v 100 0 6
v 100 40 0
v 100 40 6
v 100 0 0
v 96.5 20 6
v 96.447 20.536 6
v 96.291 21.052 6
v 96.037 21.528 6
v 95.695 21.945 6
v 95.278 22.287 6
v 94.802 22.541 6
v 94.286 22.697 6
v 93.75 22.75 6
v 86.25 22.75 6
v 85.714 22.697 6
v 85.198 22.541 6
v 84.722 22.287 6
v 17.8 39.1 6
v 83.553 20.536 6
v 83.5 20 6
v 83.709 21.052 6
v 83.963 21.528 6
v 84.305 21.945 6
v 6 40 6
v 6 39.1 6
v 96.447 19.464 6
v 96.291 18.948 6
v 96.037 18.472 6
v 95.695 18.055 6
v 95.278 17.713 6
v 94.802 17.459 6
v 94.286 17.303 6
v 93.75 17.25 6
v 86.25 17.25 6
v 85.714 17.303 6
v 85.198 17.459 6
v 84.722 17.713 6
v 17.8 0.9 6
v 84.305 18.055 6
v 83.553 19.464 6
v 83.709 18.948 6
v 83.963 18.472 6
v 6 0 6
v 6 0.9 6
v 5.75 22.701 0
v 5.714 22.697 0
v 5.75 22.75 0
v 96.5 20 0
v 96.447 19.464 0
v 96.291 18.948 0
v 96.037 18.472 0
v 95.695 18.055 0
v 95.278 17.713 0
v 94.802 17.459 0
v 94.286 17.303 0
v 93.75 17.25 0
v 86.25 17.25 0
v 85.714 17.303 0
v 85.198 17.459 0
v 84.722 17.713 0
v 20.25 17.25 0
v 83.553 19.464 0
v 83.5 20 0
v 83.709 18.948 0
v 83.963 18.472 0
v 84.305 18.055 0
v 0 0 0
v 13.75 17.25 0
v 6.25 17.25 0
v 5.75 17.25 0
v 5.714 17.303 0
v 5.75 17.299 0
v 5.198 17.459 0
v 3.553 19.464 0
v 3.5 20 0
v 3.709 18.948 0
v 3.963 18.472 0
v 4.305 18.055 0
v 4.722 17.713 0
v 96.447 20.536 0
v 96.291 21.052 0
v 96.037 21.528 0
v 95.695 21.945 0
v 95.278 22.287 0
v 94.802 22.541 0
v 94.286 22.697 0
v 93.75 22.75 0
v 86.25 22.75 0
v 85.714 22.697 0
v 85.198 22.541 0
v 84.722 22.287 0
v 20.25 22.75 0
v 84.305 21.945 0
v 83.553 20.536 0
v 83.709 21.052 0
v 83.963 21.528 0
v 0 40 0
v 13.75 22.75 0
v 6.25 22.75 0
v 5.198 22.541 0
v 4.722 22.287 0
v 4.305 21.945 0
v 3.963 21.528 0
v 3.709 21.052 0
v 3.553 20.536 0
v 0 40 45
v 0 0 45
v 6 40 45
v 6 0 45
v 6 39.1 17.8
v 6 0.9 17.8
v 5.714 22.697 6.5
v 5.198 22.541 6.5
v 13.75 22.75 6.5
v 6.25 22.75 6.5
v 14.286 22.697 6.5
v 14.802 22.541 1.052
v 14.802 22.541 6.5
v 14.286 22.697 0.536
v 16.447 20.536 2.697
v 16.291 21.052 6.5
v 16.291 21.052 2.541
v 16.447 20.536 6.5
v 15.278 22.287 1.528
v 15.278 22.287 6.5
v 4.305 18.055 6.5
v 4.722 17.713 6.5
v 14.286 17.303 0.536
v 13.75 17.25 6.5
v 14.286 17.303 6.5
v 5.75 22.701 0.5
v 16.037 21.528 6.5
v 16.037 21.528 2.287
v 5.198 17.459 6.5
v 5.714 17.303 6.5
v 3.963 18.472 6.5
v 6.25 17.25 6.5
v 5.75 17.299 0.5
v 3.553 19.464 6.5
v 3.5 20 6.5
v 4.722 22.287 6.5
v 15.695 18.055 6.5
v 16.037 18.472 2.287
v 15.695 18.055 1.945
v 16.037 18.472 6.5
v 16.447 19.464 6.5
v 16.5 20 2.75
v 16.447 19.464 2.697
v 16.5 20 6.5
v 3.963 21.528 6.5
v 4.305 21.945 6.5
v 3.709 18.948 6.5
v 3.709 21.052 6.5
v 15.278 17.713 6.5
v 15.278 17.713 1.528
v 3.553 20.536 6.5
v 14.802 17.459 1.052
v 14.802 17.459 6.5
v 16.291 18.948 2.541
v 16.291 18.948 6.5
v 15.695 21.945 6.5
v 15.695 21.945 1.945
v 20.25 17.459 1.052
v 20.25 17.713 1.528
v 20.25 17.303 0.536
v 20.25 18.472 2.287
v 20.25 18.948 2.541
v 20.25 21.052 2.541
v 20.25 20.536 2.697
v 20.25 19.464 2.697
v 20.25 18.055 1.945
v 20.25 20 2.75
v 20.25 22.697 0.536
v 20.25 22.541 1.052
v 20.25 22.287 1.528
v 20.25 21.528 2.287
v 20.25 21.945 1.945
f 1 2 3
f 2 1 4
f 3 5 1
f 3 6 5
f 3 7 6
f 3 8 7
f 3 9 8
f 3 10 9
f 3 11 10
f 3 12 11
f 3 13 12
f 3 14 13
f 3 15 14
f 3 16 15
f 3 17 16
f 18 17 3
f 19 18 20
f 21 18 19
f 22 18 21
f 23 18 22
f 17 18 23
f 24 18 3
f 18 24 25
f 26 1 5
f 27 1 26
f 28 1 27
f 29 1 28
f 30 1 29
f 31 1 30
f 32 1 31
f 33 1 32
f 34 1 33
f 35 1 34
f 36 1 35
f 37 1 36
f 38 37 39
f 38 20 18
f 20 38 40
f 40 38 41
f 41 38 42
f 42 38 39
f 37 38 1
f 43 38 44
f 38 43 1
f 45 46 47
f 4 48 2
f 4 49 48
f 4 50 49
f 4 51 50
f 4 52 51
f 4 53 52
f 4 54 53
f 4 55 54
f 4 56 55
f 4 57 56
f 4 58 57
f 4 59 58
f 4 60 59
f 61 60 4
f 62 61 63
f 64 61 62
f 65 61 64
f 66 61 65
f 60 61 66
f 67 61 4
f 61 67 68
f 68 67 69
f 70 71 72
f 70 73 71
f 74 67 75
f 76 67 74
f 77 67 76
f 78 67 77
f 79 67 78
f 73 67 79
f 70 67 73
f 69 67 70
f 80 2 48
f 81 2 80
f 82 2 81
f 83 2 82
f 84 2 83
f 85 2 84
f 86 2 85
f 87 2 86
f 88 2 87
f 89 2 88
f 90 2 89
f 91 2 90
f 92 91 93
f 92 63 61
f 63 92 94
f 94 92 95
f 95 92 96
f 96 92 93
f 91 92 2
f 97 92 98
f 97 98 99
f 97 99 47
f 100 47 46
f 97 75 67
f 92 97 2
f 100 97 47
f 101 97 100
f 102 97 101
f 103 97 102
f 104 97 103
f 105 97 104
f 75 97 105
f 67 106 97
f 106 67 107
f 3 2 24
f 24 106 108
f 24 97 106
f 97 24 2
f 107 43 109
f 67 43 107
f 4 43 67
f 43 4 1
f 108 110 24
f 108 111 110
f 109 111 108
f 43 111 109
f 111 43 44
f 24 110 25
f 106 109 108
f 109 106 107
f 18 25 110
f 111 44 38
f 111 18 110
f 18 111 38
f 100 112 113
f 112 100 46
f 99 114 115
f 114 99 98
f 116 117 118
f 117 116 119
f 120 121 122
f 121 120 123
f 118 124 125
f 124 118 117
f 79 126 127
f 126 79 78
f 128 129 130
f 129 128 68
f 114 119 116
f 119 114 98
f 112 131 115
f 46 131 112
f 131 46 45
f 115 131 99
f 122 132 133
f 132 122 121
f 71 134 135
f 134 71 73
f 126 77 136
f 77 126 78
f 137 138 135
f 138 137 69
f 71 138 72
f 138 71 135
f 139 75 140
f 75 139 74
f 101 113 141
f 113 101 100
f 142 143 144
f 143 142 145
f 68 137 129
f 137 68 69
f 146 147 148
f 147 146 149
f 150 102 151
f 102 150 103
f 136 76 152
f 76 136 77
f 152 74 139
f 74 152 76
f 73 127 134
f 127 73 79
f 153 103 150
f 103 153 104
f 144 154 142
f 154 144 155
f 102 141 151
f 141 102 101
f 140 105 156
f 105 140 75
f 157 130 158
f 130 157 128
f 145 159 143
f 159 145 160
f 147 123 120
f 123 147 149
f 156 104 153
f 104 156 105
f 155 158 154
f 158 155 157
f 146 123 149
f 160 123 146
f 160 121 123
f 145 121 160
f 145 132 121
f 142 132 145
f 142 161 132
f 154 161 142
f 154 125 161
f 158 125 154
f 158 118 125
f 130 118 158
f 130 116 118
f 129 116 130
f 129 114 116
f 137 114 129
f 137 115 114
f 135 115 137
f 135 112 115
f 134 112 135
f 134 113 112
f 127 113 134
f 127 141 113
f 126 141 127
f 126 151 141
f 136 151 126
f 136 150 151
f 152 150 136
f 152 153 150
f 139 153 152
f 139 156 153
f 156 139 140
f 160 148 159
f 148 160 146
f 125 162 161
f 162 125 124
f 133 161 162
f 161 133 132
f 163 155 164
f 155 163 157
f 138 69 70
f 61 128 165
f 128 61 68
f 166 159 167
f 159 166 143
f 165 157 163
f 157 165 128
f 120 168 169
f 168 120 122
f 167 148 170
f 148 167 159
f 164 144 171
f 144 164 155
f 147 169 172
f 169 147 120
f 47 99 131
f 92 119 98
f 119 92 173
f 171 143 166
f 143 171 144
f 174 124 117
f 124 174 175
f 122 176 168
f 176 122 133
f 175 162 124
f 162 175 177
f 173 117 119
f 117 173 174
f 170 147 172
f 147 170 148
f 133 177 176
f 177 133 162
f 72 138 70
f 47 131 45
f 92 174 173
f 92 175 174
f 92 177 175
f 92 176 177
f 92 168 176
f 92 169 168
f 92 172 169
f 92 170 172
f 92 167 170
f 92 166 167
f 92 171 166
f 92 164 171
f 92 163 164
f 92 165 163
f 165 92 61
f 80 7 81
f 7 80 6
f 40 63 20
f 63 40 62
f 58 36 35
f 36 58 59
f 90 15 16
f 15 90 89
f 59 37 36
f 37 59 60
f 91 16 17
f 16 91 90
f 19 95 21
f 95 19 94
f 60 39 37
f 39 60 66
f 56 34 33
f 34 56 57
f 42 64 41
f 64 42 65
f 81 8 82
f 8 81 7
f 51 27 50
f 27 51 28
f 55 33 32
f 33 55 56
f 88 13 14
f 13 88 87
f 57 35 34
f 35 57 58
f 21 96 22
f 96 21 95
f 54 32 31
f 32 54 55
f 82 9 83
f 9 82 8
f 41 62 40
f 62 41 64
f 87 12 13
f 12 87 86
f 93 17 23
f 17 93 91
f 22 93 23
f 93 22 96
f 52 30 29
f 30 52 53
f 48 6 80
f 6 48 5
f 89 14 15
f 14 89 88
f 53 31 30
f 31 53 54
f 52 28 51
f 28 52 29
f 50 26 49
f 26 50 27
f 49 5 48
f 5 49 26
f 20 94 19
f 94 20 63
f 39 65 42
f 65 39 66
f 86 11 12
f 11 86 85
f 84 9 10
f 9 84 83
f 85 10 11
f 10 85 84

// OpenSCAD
$fn = 32;

// ----------------------------------------------------------------------
// L-bracket: 100 x 40 x 45 mm
// ----------------------------------------------------------------------

// --- parameters (mm) ---
horiz_len = 100;          // horizontal leg, X
vert_len = 45;            // vertical leg, Z
profile_w = 40;           // bracket depth, Y
plate_t = 6;              // plate thickness
hole_d = 3.4;             // clearance for M3
slot_w = 5.5;             // euro screw slot width
slot_l = 13;              // euro screw slot length
rib_leg = 22.9;           // gusset leg
rib_sink = 0.9;           // gusset overlap into the plates

module hole_z(px, py) {
  translate([px, py, -0.5]) cylinder(h = plate_t + 1, d = hole_d);
}
module hole_x(pz, py) {
  translate([-0.5, py, pz]) rotate([0, 90, 0]) cylinder(h = plate_t + 1, d = hole_d);
}
module euro_slot_z(px, py) {
  hull() {
    translate([px - (slot_l - slot_w) / 2, py, -0.5]) cylinder(h = plate_t + 1, d = slot_w);
    translate([px + (slot_l - slot_w) / 2, py, -0.5]) cylinder(h = plate_t + 1, d = slot_w);
  }
}
module euro_slot_x(pz, py) {
  translate([-0.5, 0, 0]) rotate([0, 90, 0]) hull() {
    translate([0, py, pz - (slot_l - slot_w) / 2]) cylinder(h = plate_t + 1, d = slot_w);
    translate([0, py, pz + (slot_l - slot_w) / 2]) cylinder(h = plate_t + 1, d = slot_w);
  }
}
module gusset() {
  translate([0, profile_w - rib_sink, 0])
    rotate([90, 0, 0])
      linear_extrude(height = profile_w - 2 * rib_sink)
        polygon(points = [[rib_sink, rib_sink], [rib_leg, rib_sink], [rib_sink, rib_leg]]);
}

difference() {
  union() {
    /* horizontal leg */
    cube([horiz_len, profile_w, plate_t]);
    /* vertical leg, overlapping the corner block */
    cube([plate_t, profile_w, vert_len]);
    gusset();
  }
  euro_slot_z(10, 20);
  euro_slot_x(10, 20);
  euro_slot_z(90, 20);
}
